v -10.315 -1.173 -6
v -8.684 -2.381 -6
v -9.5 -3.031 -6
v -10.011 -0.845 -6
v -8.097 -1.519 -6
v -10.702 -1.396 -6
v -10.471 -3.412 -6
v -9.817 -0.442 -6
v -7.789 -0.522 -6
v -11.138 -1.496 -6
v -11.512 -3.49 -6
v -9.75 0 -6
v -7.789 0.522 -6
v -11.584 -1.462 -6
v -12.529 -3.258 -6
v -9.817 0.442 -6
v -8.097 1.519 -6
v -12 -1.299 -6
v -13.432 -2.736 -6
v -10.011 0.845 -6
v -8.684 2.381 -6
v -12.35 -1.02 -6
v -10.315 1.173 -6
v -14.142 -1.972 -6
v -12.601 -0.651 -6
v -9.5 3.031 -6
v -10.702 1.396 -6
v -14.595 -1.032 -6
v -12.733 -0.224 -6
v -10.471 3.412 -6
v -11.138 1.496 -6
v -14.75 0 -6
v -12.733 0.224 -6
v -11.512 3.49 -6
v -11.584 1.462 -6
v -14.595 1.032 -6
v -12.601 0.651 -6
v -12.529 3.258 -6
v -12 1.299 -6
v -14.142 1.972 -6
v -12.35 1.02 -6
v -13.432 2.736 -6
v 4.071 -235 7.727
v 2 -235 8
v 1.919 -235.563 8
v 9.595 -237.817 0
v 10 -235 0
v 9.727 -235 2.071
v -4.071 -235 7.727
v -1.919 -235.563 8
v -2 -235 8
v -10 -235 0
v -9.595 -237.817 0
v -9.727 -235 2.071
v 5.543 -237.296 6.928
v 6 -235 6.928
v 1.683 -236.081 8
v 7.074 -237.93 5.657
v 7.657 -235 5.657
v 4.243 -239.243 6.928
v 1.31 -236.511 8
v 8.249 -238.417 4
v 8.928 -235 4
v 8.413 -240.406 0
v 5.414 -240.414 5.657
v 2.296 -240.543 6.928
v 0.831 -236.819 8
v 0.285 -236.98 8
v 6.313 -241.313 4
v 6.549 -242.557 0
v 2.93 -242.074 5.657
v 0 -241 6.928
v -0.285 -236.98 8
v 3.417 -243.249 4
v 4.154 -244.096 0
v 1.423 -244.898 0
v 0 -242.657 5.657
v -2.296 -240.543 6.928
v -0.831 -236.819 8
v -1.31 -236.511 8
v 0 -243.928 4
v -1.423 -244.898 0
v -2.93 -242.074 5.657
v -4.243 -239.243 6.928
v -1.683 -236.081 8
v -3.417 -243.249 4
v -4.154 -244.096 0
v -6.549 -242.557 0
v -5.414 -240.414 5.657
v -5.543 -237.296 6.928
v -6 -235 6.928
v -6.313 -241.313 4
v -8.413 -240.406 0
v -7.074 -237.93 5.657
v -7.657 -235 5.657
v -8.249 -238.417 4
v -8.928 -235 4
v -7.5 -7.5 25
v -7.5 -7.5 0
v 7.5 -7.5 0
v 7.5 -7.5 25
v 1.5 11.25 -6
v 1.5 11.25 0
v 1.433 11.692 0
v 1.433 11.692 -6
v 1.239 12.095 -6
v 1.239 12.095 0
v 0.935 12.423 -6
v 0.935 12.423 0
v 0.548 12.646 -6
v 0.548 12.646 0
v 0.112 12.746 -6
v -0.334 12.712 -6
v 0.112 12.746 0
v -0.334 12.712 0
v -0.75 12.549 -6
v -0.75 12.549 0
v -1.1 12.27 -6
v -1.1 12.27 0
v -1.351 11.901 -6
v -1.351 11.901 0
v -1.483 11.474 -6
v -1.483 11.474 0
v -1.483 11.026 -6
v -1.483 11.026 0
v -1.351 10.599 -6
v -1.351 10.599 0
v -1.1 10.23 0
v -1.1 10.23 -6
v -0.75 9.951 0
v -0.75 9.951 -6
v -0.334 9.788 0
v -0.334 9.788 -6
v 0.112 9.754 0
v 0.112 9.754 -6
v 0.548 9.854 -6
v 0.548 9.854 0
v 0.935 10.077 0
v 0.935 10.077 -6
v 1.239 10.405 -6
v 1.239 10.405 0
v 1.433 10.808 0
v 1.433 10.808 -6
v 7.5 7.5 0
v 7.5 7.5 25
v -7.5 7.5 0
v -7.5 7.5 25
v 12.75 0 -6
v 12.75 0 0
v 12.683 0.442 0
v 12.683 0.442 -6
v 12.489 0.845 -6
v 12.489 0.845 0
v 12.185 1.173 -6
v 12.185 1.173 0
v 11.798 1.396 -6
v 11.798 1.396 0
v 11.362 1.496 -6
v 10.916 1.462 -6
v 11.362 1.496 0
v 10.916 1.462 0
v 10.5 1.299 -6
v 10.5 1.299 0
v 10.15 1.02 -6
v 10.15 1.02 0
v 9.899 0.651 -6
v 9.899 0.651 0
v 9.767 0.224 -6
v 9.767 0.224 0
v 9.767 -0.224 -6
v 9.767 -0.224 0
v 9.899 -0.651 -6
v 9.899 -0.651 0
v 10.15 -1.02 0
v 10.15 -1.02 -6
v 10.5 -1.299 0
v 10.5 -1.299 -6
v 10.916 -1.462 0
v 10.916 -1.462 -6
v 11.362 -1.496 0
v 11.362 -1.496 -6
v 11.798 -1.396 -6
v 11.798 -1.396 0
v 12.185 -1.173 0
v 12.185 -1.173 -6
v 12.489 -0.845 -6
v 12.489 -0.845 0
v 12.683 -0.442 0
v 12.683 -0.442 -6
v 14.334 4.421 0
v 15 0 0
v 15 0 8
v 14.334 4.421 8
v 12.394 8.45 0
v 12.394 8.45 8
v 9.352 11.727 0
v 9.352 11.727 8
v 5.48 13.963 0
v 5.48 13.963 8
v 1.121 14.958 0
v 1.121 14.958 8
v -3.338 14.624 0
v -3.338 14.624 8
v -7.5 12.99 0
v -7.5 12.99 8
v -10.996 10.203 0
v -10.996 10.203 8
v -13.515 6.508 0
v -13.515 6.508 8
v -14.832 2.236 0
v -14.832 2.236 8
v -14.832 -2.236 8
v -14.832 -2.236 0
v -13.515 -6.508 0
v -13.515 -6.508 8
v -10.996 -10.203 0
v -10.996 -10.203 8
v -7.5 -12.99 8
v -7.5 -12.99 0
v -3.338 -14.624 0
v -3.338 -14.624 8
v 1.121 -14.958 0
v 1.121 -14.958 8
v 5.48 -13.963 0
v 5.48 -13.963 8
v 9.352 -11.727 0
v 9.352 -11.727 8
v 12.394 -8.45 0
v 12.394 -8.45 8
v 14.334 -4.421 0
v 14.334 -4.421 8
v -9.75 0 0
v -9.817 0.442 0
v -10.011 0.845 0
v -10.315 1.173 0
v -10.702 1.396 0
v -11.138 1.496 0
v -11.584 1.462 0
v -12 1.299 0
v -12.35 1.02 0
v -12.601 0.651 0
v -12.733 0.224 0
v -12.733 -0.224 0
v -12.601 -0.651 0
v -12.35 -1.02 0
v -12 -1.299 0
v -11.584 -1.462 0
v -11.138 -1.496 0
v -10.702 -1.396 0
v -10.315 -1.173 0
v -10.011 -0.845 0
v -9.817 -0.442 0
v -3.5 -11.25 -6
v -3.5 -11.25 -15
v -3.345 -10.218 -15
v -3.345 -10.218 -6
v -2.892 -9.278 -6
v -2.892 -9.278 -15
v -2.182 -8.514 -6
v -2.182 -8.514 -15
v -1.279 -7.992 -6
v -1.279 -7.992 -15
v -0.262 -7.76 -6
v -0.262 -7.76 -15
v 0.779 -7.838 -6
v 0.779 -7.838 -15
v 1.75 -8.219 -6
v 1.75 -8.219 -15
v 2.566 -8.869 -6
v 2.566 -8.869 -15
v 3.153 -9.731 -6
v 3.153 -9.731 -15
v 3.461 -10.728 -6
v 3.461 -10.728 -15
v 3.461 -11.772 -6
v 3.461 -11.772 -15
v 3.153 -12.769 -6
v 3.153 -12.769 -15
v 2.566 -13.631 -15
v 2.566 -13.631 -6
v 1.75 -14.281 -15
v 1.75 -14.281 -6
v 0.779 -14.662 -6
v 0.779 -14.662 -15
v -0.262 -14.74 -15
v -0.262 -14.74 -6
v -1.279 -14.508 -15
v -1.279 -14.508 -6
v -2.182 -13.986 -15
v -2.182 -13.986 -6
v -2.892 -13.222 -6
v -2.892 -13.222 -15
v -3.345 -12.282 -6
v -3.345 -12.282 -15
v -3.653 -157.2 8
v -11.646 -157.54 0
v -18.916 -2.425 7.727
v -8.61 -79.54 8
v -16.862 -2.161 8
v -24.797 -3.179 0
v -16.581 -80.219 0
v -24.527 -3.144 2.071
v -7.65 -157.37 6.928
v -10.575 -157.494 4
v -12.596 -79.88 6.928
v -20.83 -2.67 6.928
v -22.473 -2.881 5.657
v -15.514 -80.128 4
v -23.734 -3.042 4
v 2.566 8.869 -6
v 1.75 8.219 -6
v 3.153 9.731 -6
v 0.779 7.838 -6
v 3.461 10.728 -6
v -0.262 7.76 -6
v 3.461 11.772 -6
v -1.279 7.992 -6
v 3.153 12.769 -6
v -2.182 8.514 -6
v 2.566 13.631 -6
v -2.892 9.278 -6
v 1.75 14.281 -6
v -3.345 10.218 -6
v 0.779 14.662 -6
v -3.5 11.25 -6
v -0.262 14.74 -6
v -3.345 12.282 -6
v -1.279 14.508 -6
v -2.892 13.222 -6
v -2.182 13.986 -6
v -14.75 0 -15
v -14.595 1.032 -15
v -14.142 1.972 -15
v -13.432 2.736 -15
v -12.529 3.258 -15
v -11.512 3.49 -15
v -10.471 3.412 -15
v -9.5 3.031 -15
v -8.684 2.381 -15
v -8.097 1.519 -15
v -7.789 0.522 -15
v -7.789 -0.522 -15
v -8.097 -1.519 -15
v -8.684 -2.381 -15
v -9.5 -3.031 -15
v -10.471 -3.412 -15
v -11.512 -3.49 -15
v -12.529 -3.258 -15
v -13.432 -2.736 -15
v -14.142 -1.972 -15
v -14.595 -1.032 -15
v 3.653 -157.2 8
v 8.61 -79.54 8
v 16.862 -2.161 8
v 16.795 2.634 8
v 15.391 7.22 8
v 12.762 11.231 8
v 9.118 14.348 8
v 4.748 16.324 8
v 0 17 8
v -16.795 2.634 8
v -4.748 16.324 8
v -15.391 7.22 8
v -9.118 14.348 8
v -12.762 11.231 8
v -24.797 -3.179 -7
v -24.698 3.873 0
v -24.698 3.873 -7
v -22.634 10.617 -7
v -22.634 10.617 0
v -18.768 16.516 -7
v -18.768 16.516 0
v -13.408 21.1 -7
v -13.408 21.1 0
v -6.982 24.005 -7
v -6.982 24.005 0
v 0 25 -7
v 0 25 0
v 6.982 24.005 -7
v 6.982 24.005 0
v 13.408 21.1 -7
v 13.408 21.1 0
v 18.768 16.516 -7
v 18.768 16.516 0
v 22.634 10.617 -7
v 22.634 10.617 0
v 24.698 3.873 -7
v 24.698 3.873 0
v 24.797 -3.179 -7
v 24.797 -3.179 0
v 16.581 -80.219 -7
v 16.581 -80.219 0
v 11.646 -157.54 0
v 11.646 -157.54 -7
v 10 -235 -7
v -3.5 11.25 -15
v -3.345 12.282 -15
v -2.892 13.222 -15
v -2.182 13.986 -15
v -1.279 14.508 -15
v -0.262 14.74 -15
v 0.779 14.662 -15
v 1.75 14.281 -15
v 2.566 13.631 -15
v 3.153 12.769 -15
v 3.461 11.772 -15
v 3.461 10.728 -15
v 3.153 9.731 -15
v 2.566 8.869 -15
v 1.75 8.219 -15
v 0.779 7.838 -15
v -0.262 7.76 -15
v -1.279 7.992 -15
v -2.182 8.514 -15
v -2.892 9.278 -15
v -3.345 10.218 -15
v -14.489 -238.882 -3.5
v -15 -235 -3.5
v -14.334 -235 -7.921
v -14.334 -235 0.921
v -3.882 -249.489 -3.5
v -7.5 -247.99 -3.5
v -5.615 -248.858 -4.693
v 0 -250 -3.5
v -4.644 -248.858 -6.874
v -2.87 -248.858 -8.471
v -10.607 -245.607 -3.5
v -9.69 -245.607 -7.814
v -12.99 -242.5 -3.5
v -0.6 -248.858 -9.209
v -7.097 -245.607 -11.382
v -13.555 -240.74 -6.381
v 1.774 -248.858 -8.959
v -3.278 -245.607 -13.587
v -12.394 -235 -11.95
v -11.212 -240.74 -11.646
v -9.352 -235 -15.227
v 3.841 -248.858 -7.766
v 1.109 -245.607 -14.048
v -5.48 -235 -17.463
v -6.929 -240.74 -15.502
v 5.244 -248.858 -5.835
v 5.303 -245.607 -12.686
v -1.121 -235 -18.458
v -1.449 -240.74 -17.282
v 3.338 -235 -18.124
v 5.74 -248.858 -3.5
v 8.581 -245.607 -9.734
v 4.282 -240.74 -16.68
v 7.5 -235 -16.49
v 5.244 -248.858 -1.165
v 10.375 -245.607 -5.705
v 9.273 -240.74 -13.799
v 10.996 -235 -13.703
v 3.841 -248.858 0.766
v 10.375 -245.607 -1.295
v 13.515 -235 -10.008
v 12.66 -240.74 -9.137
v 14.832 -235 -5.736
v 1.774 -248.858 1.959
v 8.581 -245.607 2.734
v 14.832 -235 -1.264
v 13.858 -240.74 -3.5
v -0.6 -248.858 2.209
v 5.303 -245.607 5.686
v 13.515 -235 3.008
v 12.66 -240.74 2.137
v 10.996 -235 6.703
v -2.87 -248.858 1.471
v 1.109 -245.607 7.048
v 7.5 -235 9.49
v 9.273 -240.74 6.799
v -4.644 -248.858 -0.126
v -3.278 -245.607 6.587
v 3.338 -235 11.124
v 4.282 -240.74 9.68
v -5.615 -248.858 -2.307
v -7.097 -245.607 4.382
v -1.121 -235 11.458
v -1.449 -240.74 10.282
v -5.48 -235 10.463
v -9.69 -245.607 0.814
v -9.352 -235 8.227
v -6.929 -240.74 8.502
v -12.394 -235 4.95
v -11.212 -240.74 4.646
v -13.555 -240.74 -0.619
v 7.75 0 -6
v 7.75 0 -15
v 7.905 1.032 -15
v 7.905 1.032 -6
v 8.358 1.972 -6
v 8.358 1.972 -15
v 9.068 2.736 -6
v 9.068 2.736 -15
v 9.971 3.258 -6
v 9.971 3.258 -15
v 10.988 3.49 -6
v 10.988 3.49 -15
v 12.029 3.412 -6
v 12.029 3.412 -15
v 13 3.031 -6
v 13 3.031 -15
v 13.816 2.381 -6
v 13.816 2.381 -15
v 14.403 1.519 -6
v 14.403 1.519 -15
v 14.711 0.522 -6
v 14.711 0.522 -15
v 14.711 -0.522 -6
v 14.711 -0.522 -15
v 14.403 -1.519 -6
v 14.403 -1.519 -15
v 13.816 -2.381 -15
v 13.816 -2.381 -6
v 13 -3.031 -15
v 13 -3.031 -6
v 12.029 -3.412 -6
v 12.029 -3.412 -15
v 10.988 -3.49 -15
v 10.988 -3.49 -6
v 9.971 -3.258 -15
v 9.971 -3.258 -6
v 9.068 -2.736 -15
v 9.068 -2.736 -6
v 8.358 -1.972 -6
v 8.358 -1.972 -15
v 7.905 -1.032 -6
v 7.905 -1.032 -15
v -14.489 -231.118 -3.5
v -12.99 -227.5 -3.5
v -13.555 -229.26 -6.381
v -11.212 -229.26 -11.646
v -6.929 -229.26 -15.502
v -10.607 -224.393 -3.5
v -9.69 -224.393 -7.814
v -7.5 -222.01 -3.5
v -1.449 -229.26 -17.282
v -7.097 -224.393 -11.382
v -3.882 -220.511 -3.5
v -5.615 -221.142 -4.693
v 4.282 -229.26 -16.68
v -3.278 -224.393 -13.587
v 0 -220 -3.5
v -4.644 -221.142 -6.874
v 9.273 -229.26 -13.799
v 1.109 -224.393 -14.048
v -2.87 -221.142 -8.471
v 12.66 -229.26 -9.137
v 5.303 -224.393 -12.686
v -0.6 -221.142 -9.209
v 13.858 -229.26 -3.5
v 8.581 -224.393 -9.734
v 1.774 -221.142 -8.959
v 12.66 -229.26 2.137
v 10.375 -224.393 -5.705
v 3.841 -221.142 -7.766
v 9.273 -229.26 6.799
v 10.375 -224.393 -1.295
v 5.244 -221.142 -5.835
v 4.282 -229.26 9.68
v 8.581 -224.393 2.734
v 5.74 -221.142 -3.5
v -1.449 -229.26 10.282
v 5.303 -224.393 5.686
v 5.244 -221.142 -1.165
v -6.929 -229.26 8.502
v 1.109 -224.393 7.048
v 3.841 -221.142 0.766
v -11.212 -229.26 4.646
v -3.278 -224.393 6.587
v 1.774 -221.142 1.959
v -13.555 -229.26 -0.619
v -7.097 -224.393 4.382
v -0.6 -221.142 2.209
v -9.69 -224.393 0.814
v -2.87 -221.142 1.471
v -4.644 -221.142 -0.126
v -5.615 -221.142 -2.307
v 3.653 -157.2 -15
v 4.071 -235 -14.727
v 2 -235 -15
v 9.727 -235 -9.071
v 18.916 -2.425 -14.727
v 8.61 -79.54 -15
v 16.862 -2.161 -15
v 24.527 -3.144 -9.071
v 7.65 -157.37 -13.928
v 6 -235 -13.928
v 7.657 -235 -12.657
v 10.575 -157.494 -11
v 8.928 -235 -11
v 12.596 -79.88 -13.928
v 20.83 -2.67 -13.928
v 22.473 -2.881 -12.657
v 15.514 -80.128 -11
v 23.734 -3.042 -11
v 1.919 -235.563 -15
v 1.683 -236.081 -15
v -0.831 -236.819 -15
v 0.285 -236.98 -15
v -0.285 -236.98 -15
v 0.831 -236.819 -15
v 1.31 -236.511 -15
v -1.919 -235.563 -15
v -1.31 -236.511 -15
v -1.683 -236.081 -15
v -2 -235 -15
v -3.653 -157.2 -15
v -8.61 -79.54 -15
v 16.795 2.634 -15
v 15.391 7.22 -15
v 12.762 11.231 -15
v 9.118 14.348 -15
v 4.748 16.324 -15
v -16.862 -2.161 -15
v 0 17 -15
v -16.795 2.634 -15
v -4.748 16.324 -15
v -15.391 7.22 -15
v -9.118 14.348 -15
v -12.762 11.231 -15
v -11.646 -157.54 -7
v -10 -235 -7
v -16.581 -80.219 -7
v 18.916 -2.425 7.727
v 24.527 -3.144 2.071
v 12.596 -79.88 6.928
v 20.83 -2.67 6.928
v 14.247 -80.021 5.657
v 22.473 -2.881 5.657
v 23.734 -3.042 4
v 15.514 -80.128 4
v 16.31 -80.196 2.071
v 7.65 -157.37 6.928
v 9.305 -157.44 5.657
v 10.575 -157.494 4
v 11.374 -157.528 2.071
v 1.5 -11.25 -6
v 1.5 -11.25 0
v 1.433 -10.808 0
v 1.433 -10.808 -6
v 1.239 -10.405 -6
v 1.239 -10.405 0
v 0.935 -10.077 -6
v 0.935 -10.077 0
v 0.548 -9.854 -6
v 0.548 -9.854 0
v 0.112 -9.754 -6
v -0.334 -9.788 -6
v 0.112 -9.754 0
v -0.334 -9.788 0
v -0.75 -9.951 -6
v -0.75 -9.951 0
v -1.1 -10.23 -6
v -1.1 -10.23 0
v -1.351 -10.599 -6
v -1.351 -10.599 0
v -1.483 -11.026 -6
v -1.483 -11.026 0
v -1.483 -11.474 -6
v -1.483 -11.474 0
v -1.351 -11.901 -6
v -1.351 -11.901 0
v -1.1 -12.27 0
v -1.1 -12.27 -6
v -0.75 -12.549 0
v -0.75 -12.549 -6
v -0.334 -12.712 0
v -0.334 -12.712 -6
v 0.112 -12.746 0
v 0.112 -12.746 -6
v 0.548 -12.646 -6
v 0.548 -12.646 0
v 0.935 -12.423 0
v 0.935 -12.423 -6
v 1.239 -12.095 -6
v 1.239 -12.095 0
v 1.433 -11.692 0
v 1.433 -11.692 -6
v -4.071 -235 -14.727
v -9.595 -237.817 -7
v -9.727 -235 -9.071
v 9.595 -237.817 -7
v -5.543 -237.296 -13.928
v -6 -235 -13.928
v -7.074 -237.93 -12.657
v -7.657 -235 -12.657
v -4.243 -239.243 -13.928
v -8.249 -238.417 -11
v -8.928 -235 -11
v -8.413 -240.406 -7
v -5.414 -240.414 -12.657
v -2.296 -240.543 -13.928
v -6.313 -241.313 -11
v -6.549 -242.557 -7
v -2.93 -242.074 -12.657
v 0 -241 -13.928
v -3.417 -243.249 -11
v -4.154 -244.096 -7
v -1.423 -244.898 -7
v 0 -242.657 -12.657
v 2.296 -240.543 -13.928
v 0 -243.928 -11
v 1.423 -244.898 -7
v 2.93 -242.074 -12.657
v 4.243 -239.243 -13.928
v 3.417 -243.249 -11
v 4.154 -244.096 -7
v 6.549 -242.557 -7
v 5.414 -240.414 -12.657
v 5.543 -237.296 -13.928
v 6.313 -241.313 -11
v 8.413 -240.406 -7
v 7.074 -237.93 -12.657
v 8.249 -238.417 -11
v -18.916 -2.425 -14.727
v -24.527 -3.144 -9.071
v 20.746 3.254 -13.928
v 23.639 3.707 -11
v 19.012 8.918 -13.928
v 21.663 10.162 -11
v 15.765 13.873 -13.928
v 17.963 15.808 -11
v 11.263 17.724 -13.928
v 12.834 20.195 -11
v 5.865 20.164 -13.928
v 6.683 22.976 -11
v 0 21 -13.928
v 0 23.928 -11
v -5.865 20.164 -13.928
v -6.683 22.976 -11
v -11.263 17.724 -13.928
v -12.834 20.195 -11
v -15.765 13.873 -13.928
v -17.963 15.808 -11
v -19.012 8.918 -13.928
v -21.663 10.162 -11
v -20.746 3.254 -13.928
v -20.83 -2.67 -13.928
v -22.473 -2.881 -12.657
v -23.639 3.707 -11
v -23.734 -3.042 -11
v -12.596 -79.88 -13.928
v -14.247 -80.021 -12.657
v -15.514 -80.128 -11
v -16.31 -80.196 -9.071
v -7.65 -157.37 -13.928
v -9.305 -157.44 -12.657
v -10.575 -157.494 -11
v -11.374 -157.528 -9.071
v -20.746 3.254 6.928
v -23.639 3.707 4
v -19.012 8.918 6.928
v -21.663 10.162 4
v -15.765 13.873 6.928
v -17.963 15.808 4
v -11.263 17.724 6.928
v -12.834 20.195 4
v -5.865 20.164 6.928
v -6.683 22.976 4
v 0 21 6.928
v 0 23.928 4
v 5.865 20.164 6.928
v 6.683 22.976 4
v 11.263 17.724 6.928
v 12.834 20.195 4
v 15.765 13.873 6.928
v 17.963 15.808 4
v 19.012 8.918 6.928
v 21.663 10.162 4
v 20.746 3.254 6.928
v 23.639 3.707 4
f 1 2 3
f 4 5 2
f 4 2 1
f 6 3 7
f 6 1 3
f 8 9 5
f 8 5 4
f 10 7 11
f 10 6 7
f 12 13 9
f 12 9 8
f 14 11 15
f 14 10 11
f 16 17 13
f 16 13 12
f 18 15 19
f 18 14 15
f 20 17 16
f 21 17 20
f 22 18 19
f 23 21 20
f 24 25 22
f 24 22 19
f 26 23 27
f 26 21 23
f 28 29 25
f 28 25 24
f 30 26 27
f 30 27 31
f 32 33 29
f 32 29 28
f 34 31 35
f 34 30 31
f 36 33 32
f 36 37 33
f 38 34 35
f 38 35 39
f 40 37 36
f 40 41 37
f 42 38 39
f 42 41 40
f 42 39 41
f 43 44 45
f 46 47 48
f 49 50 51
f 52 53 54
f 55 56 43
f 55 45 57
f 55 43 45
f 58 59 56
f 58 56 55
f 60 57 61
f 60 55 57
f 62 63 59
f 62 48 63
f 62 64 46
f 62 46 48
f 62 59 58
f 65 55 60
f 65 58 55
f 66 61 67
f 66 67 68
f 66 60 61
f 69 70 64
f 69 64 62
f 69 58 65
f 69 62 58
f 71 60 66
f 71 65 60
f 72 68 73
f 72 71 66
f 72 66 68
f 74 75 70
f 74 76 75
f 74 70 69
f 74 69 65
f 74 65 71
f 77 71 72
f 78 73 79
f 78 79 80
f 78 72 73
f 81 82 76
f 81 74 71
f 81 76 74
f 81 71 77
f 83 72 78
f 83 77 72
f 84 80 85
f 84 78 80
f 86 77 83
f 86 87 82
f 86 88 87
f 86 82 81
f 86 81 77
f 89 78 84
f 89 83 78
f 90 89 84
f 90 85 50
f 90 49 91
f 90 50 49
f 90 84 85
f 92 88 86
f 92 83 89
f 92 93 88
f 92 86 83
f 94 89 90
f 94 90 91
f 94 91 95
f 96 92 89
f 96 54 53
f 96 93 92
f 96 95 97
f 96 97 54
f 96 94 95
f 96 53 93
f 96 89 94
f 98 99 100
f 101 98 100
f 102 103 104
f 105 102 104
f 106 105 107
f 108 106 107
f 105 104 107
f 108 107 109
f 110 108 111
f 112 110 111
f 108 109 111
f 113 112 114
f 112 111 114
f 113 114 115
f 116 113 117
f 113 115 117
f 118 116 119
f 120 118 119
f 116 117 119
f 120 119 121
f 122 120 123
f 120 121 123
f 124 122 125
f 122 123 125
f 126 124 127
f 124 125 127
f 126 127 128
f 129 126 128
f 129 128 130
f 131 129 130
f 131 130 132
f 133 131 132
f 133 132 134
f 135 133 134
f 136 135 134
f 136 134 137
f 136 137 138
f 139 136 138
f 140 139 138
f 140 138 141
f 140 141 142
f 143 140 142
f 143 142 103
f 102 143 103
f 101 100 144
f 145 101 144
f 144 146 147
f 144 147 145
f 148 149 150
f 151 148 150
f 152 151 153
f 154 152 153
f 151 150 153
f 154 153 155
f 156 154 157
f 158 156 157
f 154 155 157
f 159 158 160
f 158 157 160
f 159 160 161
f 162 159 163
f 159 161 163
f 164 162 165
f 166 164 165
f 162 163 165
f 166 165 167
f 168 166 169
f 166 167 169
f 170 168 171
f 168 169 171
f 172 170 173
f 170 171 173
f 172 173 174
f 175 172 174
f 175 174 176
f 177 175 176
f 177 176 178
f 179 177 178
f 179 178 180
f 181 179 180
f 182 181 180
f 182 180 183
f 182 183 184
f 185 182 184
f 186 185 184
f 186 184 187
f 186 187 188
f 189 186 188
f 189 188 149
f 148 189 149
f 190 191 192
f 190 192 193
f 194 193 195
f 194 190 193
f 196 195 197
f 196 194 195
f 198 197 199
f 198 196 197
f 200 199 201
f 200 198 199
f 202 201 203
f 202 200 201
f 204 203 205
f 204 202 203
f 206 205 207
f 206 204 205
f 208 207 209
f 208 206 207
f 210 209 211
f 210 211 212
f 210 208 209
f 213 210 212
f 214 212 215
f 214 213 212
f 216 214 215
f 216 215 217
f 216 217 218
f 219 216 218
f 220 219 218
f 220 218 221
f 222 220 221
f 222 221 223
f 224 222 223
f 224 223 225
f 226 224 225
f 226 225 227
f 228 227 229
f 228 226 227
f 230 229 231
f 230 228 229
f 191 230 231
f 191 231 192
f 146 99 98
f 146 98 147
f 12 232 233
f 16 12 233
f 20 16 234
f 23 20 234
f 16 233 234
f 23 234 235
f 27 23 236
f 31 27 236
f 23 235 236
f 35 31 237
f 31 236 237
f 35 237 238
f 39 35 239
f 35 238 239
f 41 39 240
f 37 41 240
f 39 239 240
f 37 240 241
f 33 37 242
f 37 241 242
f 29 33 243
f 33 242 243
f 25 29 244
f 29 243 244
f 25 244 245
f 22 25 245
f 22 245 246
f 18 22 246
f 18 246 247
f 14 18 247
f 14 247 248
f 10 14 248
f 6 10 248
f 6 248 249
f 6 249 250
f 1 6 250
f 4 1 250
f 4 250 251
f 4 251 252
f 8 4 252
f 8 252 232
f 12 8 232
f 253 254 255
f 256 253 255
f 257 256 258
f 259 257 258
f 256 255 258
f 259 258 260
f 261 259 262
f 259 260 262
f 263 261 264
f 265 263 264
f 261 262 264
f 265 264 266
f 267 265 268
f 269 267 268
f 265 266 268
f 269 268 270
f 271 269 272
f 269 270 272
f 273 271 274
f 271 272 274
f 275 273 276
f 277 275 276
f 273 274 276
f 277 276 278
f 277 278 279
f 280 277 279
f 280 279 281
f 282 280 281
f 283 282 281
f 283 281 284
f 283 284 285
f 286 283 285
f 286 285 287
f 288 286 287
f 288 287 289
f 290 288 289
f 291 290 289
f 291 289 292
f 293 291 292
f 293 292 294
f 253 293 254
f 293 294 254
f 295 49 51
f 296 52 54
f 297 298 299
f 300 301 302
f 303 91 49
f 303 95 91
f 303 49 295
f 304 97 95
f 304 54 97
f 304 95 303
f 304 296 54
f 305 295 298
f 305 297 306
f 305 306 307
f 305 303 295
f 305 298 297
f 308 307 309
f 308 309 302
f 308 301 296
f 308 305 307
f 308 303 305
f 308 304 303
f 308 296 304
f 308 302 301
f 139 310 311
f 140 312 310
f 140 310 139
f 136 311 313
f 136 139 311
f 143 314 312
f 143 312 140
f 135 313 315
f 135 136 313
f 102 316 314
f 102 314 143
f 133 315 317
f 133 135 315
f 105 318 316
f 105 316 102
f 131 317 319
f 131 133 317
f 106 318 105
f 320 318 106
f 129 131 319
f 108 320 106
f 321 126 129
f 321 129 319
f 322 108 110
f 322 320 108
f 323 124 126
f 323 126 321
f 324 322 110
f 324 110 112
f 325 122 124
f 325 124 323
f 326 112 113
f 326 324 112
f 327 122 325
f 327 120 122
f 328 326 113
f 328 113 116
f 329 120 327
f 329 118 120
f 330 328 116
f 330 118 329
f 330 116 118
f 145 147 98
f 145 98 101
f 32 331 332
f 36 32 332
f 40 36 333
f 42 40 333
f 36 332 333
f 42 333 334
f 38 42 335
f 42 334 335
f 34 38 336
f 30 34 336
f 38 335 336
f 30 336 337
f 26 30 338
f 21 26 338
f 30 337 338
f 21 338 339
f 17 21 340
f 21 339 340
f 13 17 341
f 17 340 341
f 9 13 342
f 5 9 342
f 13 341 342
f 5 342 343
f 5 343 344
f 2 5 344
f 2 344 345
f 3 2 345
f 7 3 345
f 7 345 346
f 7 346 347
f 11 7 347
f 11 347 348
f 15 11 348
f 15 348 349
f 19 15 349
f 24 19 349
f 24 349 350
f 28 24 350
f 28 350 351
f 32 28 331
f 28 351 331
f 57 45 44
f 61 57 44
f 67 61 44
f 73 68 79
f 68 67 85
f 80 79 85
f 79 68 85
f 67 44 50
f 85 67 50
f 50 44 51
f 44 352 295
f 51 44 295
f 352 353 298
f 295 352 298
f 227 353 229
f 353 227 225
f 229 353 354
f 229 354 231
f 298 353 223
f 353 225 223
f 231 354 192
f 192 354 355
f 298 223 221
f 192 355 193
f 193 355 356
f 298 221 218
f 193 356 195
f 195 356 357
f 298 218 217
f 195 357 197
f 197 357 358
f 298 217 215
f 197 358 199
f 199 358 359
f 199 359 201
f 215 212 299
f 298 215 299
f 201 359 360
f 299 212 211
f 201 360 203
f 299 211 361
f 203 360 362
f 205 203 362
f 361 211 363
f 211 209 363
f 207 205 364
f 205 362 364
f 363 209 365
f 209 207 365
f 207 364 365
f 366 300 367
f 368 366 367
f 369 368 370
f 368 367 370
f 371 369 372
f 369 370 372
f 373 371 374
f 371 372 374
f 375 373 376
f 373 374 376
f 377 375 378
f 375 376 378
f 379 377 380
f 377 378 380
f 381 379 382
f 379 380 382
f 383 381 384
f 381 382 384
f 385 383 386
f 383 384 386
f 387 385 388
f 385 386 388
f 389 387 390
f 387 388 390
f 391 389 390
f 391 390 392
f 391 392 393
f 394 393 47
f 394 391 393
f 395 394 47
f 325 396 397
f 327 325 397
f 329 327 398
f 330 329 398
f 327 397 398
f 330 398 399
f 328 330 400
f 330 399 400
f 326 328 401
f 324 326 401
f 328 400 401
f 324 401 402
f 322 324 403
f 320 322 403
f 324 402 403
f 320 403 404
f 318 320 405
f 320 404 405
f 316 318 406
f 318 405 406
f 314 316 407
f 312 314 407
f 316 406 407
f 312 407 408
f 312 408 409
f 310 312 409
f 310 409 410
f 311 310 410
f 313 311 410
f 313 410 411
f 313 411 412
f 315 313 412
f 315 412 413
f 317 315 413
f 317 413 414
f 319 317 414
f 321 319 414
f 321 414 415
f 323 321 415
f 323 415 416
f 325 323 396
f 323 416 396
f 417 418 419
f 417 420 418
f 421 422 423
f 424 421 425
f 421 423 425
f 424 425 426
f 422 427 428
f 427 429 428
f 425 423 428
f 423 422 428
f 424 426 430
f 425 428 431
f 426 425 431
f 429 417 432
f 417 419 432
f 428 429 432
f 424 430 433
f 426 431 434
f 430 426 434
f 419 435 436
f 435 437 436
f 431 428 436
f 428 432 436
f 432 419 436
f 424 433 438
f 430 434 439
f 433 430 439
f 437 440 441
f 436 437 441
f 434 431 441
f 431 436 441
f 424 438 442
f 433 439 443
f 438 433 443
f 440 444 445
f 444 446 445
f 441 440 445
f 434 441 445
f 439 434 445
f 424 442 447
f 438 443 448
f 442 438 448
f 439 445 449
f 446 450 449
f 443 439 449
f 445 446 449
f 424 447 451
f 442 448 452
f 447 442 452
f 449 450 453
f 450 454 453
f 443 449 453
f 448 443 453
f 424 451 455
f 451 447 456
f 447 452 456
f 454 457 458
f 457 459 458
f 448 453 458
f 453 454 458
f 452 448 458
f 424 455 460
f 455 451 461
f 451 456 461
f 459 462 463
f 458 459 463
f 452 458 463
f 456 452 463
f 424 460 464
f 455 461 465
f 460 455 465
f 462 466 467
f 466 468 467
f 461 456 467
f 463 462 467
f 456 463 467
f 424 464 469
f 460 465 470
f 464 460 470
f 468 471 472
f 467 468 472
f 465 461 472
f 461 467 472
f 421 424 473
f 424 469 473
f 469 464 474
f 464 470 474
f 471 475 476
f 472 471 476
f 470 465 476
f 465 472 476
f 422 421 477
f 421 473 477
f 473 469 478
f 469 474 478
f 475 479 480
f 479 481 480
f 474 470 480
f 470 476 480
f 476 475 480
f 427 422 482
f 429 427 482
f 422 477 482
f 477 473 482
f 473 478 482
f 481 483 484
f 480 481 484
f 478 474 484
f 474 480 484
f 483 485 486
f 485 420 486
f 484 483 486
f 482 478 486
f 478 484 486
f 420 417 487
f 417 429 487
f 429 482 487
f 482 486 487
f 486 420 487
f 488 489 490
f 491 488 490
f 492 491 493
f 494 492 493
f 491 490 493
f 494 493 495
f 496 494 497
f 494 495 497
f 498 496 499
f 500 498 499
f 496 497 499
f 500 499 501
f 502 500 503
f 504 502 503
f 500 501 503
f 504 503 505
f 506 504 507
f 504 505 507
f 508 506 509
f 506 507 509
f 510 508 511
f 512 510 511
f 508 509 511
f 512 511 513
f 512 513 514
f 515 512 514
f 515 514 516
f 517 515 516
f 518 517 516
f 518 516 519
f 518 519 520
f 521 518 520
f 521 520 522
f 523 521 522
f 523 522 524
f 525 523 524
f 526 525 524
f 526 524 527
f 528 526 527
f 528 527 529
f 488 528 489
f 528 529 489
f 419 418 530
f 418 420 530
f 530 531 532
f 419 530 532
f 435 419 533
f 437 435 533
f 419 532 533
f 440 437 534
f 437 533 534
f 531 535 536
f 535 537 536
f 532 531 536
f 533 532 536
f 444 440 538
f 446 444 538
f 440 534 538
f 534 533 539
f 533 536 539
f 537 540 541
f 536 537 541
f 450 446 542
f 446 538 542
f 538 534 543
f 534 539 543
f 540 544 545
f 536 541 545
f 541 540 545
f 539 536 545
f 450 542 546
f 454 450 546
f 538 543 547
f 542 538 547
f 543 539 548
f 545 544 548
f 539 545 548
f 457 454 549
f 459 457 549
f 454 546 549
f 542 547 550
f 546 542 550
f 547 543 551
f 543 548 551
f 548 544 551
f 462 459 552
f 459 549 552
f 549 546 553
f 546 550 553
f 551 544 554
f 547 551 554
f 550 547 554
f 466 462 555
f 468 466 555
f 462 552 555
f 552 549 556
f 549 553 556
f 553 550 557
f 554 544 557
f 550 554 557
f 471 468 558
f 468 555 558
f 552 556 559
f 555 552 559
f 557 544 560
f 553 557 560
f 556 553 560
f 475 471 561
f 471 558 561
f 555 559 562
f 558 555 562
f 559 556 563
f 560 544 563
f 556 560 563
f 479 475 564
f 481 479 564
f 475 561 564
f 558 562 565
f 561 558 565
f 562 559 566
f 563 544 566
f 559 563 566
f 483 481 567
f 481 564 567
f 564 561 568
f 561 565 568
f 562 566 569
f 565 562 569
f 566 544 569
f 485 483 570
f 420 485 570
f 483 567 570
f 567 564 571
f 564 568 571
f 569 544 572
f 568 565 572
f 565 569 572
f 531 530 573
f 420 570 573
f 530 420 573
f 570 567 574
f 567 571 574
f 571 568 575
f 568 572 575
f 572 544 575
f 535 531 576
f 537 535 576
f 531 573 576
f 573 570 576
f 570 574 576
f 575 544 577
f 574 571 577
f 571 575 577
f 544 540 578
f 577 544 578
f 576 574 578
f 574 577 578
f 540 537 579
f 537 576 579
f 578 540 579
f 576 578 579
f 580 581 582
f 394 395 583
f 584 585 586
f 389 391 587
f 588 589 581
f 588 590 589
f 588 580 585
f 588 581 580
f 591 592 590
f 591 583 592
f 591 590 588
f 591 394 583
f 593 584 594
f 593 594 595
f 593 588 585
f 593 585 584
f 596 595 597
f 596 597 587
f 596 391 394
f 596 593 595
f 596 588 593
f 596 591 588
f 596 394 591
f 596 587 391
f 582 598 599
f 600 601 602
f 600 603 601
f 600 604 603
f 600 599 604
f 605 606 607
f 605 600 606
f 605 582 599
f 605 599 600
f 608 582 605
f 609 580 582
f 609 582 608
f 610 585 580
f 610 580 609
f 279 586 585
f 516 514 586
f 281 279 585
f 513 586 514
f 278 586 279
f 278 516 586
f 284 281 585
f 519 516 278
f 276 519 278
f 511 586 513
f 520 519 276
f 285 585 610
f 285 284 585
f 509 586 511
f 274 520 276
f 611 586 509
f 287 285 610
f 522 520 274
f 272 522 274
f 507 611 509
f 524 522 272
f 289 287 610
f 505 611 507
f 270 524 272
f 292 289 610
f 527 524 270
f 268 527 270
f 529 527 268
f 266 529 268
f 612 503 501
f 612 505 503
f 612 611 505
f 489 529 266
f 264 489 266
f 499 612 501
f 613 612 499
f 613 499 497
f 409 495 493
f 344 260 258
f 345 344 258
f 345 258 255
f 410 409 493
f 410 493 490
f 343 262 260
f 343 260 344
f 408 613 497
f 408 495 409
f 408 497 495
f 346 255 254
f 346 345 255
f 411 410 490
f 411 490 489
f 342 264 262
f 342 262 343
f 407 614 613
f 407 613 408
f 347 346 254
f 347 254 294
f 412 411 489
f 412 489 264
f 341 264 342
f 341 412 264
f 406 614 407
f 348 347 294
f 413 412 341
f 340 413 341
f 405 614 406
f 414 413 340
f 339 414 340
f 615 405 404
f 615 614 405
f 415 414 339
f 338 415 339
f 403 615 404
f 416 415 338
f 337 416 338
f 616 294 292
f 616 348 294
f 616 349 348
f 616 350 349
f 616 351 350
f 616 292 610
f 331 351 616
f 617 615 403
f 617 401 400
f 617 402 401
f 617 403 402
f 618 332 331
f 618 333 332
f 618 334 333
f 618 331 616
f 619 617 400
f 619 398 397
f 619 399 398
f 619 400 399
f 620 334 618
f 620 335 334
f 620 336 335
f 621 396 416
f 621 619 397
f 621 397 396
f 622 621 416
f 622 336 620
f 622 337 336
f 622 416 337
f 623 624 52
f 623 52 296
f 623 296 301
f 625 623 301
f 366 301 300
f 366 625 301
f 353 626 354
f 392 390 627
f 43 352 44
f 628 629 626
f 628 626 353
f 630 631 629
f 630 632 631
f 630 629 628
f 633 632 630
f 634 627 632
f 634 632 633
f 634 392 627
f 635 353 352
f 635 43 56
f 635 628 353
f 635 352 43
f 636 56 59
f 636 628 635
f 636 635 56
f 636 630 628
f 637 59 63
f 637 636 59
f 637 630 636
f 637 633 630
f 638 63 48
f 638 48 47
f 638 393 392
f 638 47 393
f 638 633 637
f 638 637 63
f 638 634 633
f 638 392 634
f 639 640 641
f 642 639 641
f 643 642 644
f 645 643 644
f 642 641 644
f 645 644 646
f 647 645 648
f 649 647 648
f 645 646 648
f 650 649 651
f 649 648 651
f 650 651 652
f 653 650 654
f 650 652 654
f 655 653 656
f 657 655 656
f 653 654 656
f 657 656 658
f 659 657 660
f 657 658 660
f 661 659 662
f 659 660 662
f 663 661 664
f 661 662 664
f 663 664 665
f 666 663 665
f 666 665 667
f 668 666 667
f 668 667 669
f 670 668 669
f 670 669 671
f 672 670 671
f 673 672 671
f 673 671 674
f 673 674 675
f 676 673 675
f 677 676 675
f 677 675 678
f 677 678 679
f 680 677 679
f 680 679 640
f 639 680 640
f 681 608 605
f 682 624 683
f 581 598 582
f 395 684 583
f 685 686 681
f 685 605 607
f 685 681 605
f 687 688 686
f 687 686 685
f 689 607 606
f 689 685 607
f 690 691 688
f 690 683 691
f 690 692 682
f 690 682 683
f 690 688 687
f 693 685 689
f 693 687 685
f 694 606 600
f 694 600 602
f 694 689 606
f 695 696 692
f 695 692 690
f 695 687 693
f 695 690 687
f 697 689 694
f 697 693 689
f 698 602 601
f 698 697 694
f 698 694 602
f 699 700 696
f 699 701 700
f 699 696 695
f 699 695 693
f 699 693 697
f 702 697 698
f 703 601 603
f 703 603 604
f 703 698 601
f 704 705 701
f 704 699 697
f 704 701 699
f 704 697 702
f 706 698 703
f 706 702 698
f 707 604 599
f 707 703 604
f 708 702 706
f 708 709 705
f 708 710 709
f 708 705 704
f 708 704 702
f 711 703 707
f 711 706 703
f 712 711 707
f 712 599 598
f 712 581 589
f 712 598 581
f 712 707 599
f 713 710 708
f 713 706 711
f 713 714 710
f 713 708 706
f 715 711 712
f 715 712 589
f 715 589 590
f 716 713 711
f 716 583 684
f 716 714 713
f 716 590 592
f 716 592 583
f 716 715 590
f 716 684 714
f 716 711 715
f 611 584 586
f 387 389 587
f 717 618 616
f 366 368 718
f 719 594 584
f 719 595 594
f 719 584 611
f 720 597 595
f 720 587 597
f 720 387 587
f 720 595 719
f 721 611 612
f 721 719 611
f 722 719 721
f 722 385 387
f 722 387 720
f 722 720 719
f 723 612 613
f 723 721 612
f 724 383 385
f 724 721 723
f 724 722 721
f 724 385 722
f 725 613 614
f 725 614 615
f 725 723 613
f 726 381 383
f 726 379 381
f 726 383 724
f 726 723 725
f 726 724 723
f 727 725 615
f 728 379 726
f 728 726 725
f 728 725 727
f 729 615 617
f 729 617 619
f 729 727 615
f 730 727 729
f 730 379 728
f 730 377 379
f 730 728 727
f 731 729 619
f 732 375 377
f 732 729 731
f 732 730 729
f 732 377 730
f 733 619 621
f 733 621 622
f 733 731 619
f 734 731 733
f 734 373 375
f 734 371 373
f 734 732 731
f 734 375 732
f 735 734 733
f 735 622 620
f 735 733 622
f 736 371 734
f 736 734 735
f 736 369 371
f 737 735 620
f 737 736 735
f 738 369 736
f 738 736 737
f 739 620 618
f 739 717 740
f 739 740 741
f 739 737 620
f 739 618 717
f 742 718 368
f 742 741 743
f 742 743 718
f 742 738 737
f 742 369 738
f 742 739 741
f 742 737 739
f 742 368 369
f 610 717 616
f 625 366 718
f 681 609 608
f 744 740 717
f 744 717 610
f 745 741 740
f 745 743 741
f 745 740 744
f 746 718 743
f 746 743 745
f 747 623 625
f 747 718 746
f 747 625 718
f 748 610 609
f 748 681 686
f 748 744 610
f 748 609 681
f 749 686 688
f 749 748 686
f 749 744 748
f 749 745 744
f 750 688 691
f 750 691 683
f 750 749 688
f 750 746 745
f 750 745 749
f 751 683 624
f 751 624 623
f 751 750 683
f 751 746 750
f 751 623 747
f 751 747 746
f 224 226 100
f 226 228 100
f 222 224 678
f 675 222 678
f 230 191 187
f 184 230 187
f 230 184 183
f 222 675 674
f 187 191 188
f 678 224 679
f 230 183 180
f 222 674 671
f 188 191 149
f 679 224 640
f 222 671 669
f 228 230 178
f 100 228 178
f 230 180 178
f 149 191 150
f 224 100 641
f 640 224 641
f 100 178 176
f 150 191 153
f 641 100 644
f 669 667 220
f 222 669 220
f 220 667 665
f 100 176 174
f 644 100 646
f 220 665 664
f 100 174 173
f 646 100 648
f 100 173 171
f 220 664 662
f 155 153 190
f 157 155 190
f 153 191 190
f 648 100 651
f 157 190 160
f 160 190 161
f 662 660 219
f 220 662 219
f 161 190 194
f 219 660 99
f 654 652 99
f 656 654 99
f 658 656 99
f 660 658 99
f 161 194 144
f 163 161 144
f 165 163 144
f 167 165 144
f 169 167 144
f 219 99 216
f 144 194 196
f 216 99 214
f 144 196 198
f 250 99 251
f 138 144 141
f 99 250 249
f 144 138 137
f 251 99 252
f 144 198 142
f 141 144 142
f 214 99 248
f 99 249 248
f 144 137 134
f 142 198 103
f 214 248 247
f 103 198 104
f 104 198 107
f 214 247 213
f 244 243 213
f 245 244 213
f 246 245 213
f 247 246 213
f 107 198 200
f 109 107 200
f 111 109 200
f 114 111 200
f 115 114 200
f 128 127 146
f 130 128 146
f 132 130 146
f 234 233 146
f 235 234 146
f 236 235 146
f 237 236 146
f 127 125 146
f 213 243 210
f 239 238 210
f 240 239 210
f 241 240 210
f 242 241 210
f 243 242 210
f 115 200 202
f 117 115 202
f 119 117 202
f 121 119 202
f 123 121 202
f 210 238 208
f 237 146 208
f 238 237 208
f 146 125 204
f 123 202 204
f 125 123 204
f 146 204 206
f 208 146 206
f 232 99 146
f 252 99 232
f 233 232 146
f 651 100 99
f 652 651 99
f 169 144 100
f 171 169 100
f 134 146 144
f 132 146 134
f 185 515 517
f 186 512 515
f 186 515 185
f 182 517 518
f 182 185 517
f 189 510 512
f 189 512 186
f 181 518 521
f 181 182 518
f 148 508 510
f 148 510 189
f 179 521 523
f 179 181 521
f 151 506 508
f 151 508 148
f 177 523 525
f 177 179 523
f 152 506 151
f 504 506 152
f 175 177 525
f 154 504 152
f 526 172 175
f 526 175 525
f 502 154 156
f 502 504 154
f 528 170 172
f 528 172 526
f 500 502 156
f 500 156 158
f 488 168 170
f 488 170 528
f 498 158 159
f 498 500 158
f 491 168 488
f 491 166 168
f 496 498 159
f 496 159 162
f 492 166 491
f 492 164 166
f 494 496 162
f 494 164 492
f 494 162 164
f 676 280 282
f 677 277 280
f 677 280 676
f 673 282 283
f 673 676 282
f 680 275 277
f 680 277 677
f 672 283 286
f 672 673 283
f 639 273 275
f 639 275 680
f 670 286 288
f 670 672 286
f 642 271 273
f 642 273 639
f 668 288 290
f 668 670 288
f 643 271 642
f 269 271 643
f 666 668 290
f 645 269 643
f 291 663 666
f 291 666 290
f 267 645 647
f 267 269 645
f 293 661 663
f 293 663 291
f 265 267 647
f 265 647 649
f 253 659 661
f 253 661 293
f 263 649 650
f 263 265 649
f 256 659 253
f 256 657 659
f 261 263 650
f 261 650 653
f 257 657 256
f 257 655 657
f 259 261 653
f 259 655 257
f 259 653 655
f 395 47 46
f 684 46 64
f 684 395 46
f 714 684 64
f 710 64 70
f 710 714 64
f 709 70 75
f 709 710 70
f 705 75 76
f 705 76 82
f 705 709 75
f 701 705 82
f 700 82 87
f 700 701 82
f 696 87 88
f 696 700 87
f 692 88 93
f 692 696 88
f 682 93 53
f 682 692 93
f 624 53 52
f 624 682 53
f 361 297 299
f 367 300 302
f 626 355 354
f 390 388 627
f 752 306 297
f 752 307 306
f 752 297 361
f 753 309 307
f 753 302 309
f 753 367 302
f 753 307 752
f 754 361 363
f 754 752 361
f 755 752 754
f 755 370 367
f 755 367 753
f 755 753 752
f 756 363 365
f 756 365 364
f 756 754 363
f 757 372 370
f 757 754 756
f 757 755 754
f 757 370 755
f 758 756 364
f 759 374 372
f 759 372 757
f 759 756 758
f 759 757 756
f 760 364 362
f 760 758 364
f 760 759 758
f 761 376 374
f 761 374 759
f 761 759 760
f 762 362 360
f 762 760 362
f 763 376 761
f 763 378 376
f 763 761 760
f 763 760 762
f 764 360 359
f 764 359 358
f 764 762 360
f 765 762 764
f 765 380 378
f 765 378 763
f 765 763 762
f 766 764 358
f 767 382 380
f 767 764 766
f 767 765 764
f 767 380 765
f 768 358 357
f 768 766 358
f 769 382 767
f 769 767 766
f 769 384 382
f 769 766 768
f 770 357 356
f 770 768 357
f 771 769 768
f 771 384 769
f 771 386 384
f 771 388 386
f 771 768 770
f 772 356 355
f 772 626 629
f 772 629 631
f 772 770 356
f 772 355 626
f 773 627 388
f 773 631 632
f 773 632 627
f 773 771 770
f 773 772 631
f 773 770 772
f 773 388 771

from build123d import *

# Parameters (mm, degrees)
SKETCH3_R               = 25
SKETCH3_R_2             = 15
BOSS_EXTRUDE1_DEPTH     = 8
SKETCH4_R               = 25
BOSS_EXTRUDE2_DEPTH     = 15
SKETCH5_W               = 15
SKETCH5_H               = 15
BOSS_EXTRUDE3_DEPTH     = 25
SKETCH6_R               = 10
BOSS_EXTRUDE4_DEPTH     = 23
FILLET1_R               = 8
FILLET2_R               = 8
SKETCH8_R               = 1.5
CUT_EXTRUDE1_DEPTH      = 26
CUT_EXTRUDE1_DEPTH_BACK = 19.5
SKETCH9_R               = 3.5
SKETCH9_R_2             = 1.5
CUT_EXTRUDE2_DEPTH      = 9


with BuildPart() as part:
    # Sketch3 → Boss-Extrude1 (new body)
    with BuildSketch(Plane.XY):
        Circle(SKETCH3_R)
        Circle(SKETCH3_R_2, mode=Mode.SUBTRACT)
    extrude(amount=BOSS_EXTRUDE1_DEPTH)

    # Sketch4 → Boss-Extrude2 (add)
    with BuildSketch(Plane(origin=(0, 0, 0), x_dir=(-1, 0, 0), z_dir=(0, 0, -1))):
        Circle(SKETCH4_R)
    extrude(amount=BOSS_EXTRUDE2_DEPTH)

    # Sketch5 → Boss-Extrude3 (add)
    with BuildSketch(Plane.XY):
        Rectangle(SKETCH5_W, SKETCH5_H)
    extrude(amount=BOSS_EXTRUDE3_DEPTH)

    # Sketch6 → Boss-Extrude4 (add)
    with BuildSketch(Plane(origin=(0, 0, -15), x_dir=(-1, 0, 0), z_dir=(0, 0, -1))):
        with BuildLine():
            ThreePointArc((-10, -235), (0, -225), (10, -235))
            ThreePointArc((10, -235), (13.703038867, -118.853386163), (24.797114339, -3.178540617))
            ThreePointArc((24.797114339, -3.178540617), (-9.25e-07, -25), (-24.797114574, -3.178538781))
            ThreePointArc((-24.797114574, -3.178538781), (-13.703038926, -118.853385239), (-10, -235))
        make_face()
        with Locations((0, -235)):
            Circle(SKETCH6_R)
    extrude(amount=-BOSS_EXTRUDE4_DEPTH)

    # Fillet1
    fillet1_edges = [part.edges().sort_by_distance(p)[0] for p in [
        (-9.25e-07, 25, -15),
        (0, -245, -15),
        (-13.703038867, -118.853386163, -15),
        (13.703038926, -118.853385239, -15),
    ]]
    fillet(fillet1_edges, radius=FILLET1_R)

    # Fillet2
    fillet2_edges = [part.edges().sort_by_distance(p)[0] for p in [
        (-9.25e-07, 25, 8),
        (13.703038926, -118.853385239, 8),
        (0, -245, 8),
        (-13.703038867, -118.853386163, 8),
    ]]
    fillet(fillet2_edges, radius=FILLET2_R)

    # Sketch8 → Cut-Extrude1 (cut, two sides)
    with BuildSketch(Plane.XY) as cut_extrude1_sk:
        with Locations((11.25, 0)):
            Circle(SKETCH8_R)
        with Locations((0, -11.25)):
            Circle(SKETCH8_R)
        with Locations((-11.25, 0)):
            Circle(SKETCH8_R)
        with Locations((0, 11.25)):
            Circle(SKETCH8_R)
    extrude(amount=CUT_EXTRUDE1_DEPTH, mode=Mode.SUBTRACT)
    extrude(cut_extrude1_sk.sketch, amount=-CUT_EXTRUDE1_DEPTH_BACK, mode=Mode.SUBTRACT)

    # Sketch9 → Cut-Extrude2 (cut)
    with BuildSketch(Plane(origin=(0, 0, -15), x_dir=(-1, 0, 0), z_dir=(0, 0, -1))):
        with Locations((11.25, 0)):
            Circle(SKETCH9_R)
        with Locations((11.25, 0)):
            Circle(SKETCH9_R_2, mode=Mode.SUBTRACT)
        with Locations((0, -11.25)):
            Circle(SKETCH9_R)
        with Locations((0, -11.25)):
            Circle(SKETCH9_R_2, mode=Mode.SUBTRACT)
        with Locations((-11.25, 0)):
            Circle(SKETCH9_R)
        with Locations((-11.25, 0)):
            Circle(SKETCH9_R_2, mode=Mode.SUBTRACT)
        with Locations((0, 11.25)):
            Circle(SKETCH9_R)
    extrude(amount=-CUT_EXTRUDE2_DEPTH, mode=Mode.SUBTRACT)


with BuildPart() as body_2:
    # Sketch7 one side → Revolve2 (revolve)
    with BuildSketch(Plane(origin=(0, 0, -3.5), x_dir=(-1, 0, 0), z_dir=(0, 0, -1))):
        with BuildLine():
            ThreePointArc((0, -250), (10.606601718, -245.606601718), (15, -235))
            ThreePointArc((15, -235), (10.606601718, -224.393398282), (0, -220))
            Line((0, -220), (0, -250))
        make_face()
    revolve(axis=Axis((0, -220, -3.5), (0, -1, 0)))


solid = Compound([part.part, body_2.part])
